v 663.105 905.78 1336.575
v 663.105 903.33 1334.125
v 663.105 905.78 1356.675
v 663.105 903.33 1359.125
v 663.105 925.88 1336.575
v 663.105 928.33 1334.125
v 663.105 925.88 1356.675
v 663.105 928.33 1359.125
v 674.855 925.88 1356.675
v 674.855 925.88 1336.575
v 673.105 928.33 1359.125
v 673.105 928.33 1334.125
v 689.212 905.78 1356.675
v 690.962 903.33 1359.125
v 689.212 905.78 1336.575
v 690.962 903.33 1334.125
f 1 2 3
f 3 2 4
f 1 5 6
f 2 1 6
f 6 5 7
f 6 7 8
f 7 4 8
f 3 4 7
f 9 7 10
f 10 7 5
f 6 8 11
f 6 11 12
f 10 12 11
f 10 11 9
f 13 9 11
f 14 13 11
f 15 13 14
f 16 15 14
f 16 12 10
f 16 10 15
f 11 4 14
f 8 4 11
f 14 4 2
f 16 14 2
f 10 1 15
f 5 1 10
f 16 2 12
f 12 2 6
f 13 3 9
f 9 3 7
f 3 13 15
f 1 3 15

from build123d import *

# Parameters (mm, degrees)
BOSS_EXTRUDE1_START       = 663.104666785
BOSS_EXTRUDE1_OUTLINE_W   = 25
BOSS_EXTRUDE1_OUTLINE_H   = 25
BOSS_EXTRUDE1_OUTLINE_W_2 = 20.1
BOSS_EXTRUDE1_OUTLINE_H_2 = 20.1
BOSS_EXTRUDE1_DEPTH       = 27.857142858
BOSS_EXTRUDE1_START_2     = 1064
BOSS_EXTRUDE1_2_OUTLINE_W = 39
BOSS_EXTRUDE1_2_OUTLINE_H = 25
BOSS_EXTRUDE1_2_DEPTH     = 15.171213372
BOSS_EXTRUDE1_START_3     = 1087.308548084
BOSS_EXTRUDE1_3_OUTLINE_W = 39
BOSS_EXTRUDE1_3_OUTLINE_H = 25
BOSS_EXTRUDE1_3_DEPTH     = 15.691451916
BOSS_EXTRUDE2_DEPTH       = 25
CUT_EXTRUDE2_REACH        = 1648.145
SKETCH7_W                 = 20.1
SKETCH7_H                 = 20.1


with BuildPart() as part:
    # Boss-Extrude1: read off the stored shape, not the designer's step
    # Boss-Extrude1 outline → Boss-Extrude1 (new body)
    with BuildSketch(Plane(origin=(0, 0, 0), x_dir=(0, 0, -1), z_dir=(1, 0, 0)).offset(BOSS_EXTRUDE1_START)):
        with Locations((-1346.624663727, 915.829825752)):
            Rectangle(BOSS_EXTRUDE1_OUTLINE_W, BOSS_EXTRUDE1_OUTLINE_H)
        with Locations((-1346.624663727, 915.829825752)):
            Rectangle(BOSS_EXTRUDE1_OUTLINE_W_2, BOSS_EXTRUDE1_OUTLINE_H_2, mode=Mode.SUBTRACT)
    extrude(amount=BOSS_EXTRUDE1_DEPTH)

    # Boss-Extrude1 2 outline → Boss-Extrude1 2 (cut)
    with BuildSketch(Plane(origin=(0, 0, 0), x_dir=(0.5812381937190959, -0.8137334712067352, 0), z_dir=(0.8137334712067352, 0.5812381937190961, 0)).offset(BOSS_EXTRUDE1_START_2)):
        with Locations((-351.5, -1346.624663727)):
            Rectangle(BOSS_EXTRUDE1_2_OUTLINE_W, BOSS_EXTRUDE1_2_OUTLINE_H)
    extrude(amount=BOSS_EXTRUDE1_2_DEPTH, mode=Mode.SUBTRACT)

    # Boss-Extrude1 3 outline → Boss-Extrude1 3 (cut)
    with BuildSketch(Plane(origin=(0, 0, 0), x_dir=(0.5812381937190959, -0.8137334712067352, 0), z_dir=(0.8137334712067352, 0.5812381937190961, 0)).offset(BOSS_EXTRUDE1_START_3)):
        with Locations((-351.5, -1346.624663727)):
            Rectangle(BOSS_EXTRUDE1_3_OUTLINE_W, BOSS_EXTRUDE1_3_OUTLINE_H)
    extrude(amount=BOSS_EXTRUDE1_3_DEPTH, mode=Mode.SUBTRACT)

    # Sketch5 → Boss-Extrude2 (add)
    with BuildSketch(Plane.XY.offset(1359.124663727)):
        Polygon((663.104666785, 928.329825752), (680.961809643, 903.329825752), (663.104666785, 903.329825752), align=None)
    extrude(amount=-BOSS_EXTRUDE2_DEPTH)

    # Sketch7 → Cut-Extrude2 (cut, up to next)
    with BuildSketch(Plane.ZY.offset(-663.104666785), mode=Mode.PRIVATE) as cut_extrude2_sk1:
        with Locations((1346.624663727, 915.829825752)):
            Rectangle(SKETCH7_W, SKETCH7_H)
    cut_extrude2_tool1 = extrude(cut_extrude2_sk1.sketch, amount=-CUT_EXTRUDE2_REACH, mode=Mode.PRIVATE) & part.part
    add(cut_extrude2_tool1.solids().sort_by_distance((663.104667, 915.829826, 1346.624664))[0], mode=Mode.SUBTRACT)


solid = part.part
